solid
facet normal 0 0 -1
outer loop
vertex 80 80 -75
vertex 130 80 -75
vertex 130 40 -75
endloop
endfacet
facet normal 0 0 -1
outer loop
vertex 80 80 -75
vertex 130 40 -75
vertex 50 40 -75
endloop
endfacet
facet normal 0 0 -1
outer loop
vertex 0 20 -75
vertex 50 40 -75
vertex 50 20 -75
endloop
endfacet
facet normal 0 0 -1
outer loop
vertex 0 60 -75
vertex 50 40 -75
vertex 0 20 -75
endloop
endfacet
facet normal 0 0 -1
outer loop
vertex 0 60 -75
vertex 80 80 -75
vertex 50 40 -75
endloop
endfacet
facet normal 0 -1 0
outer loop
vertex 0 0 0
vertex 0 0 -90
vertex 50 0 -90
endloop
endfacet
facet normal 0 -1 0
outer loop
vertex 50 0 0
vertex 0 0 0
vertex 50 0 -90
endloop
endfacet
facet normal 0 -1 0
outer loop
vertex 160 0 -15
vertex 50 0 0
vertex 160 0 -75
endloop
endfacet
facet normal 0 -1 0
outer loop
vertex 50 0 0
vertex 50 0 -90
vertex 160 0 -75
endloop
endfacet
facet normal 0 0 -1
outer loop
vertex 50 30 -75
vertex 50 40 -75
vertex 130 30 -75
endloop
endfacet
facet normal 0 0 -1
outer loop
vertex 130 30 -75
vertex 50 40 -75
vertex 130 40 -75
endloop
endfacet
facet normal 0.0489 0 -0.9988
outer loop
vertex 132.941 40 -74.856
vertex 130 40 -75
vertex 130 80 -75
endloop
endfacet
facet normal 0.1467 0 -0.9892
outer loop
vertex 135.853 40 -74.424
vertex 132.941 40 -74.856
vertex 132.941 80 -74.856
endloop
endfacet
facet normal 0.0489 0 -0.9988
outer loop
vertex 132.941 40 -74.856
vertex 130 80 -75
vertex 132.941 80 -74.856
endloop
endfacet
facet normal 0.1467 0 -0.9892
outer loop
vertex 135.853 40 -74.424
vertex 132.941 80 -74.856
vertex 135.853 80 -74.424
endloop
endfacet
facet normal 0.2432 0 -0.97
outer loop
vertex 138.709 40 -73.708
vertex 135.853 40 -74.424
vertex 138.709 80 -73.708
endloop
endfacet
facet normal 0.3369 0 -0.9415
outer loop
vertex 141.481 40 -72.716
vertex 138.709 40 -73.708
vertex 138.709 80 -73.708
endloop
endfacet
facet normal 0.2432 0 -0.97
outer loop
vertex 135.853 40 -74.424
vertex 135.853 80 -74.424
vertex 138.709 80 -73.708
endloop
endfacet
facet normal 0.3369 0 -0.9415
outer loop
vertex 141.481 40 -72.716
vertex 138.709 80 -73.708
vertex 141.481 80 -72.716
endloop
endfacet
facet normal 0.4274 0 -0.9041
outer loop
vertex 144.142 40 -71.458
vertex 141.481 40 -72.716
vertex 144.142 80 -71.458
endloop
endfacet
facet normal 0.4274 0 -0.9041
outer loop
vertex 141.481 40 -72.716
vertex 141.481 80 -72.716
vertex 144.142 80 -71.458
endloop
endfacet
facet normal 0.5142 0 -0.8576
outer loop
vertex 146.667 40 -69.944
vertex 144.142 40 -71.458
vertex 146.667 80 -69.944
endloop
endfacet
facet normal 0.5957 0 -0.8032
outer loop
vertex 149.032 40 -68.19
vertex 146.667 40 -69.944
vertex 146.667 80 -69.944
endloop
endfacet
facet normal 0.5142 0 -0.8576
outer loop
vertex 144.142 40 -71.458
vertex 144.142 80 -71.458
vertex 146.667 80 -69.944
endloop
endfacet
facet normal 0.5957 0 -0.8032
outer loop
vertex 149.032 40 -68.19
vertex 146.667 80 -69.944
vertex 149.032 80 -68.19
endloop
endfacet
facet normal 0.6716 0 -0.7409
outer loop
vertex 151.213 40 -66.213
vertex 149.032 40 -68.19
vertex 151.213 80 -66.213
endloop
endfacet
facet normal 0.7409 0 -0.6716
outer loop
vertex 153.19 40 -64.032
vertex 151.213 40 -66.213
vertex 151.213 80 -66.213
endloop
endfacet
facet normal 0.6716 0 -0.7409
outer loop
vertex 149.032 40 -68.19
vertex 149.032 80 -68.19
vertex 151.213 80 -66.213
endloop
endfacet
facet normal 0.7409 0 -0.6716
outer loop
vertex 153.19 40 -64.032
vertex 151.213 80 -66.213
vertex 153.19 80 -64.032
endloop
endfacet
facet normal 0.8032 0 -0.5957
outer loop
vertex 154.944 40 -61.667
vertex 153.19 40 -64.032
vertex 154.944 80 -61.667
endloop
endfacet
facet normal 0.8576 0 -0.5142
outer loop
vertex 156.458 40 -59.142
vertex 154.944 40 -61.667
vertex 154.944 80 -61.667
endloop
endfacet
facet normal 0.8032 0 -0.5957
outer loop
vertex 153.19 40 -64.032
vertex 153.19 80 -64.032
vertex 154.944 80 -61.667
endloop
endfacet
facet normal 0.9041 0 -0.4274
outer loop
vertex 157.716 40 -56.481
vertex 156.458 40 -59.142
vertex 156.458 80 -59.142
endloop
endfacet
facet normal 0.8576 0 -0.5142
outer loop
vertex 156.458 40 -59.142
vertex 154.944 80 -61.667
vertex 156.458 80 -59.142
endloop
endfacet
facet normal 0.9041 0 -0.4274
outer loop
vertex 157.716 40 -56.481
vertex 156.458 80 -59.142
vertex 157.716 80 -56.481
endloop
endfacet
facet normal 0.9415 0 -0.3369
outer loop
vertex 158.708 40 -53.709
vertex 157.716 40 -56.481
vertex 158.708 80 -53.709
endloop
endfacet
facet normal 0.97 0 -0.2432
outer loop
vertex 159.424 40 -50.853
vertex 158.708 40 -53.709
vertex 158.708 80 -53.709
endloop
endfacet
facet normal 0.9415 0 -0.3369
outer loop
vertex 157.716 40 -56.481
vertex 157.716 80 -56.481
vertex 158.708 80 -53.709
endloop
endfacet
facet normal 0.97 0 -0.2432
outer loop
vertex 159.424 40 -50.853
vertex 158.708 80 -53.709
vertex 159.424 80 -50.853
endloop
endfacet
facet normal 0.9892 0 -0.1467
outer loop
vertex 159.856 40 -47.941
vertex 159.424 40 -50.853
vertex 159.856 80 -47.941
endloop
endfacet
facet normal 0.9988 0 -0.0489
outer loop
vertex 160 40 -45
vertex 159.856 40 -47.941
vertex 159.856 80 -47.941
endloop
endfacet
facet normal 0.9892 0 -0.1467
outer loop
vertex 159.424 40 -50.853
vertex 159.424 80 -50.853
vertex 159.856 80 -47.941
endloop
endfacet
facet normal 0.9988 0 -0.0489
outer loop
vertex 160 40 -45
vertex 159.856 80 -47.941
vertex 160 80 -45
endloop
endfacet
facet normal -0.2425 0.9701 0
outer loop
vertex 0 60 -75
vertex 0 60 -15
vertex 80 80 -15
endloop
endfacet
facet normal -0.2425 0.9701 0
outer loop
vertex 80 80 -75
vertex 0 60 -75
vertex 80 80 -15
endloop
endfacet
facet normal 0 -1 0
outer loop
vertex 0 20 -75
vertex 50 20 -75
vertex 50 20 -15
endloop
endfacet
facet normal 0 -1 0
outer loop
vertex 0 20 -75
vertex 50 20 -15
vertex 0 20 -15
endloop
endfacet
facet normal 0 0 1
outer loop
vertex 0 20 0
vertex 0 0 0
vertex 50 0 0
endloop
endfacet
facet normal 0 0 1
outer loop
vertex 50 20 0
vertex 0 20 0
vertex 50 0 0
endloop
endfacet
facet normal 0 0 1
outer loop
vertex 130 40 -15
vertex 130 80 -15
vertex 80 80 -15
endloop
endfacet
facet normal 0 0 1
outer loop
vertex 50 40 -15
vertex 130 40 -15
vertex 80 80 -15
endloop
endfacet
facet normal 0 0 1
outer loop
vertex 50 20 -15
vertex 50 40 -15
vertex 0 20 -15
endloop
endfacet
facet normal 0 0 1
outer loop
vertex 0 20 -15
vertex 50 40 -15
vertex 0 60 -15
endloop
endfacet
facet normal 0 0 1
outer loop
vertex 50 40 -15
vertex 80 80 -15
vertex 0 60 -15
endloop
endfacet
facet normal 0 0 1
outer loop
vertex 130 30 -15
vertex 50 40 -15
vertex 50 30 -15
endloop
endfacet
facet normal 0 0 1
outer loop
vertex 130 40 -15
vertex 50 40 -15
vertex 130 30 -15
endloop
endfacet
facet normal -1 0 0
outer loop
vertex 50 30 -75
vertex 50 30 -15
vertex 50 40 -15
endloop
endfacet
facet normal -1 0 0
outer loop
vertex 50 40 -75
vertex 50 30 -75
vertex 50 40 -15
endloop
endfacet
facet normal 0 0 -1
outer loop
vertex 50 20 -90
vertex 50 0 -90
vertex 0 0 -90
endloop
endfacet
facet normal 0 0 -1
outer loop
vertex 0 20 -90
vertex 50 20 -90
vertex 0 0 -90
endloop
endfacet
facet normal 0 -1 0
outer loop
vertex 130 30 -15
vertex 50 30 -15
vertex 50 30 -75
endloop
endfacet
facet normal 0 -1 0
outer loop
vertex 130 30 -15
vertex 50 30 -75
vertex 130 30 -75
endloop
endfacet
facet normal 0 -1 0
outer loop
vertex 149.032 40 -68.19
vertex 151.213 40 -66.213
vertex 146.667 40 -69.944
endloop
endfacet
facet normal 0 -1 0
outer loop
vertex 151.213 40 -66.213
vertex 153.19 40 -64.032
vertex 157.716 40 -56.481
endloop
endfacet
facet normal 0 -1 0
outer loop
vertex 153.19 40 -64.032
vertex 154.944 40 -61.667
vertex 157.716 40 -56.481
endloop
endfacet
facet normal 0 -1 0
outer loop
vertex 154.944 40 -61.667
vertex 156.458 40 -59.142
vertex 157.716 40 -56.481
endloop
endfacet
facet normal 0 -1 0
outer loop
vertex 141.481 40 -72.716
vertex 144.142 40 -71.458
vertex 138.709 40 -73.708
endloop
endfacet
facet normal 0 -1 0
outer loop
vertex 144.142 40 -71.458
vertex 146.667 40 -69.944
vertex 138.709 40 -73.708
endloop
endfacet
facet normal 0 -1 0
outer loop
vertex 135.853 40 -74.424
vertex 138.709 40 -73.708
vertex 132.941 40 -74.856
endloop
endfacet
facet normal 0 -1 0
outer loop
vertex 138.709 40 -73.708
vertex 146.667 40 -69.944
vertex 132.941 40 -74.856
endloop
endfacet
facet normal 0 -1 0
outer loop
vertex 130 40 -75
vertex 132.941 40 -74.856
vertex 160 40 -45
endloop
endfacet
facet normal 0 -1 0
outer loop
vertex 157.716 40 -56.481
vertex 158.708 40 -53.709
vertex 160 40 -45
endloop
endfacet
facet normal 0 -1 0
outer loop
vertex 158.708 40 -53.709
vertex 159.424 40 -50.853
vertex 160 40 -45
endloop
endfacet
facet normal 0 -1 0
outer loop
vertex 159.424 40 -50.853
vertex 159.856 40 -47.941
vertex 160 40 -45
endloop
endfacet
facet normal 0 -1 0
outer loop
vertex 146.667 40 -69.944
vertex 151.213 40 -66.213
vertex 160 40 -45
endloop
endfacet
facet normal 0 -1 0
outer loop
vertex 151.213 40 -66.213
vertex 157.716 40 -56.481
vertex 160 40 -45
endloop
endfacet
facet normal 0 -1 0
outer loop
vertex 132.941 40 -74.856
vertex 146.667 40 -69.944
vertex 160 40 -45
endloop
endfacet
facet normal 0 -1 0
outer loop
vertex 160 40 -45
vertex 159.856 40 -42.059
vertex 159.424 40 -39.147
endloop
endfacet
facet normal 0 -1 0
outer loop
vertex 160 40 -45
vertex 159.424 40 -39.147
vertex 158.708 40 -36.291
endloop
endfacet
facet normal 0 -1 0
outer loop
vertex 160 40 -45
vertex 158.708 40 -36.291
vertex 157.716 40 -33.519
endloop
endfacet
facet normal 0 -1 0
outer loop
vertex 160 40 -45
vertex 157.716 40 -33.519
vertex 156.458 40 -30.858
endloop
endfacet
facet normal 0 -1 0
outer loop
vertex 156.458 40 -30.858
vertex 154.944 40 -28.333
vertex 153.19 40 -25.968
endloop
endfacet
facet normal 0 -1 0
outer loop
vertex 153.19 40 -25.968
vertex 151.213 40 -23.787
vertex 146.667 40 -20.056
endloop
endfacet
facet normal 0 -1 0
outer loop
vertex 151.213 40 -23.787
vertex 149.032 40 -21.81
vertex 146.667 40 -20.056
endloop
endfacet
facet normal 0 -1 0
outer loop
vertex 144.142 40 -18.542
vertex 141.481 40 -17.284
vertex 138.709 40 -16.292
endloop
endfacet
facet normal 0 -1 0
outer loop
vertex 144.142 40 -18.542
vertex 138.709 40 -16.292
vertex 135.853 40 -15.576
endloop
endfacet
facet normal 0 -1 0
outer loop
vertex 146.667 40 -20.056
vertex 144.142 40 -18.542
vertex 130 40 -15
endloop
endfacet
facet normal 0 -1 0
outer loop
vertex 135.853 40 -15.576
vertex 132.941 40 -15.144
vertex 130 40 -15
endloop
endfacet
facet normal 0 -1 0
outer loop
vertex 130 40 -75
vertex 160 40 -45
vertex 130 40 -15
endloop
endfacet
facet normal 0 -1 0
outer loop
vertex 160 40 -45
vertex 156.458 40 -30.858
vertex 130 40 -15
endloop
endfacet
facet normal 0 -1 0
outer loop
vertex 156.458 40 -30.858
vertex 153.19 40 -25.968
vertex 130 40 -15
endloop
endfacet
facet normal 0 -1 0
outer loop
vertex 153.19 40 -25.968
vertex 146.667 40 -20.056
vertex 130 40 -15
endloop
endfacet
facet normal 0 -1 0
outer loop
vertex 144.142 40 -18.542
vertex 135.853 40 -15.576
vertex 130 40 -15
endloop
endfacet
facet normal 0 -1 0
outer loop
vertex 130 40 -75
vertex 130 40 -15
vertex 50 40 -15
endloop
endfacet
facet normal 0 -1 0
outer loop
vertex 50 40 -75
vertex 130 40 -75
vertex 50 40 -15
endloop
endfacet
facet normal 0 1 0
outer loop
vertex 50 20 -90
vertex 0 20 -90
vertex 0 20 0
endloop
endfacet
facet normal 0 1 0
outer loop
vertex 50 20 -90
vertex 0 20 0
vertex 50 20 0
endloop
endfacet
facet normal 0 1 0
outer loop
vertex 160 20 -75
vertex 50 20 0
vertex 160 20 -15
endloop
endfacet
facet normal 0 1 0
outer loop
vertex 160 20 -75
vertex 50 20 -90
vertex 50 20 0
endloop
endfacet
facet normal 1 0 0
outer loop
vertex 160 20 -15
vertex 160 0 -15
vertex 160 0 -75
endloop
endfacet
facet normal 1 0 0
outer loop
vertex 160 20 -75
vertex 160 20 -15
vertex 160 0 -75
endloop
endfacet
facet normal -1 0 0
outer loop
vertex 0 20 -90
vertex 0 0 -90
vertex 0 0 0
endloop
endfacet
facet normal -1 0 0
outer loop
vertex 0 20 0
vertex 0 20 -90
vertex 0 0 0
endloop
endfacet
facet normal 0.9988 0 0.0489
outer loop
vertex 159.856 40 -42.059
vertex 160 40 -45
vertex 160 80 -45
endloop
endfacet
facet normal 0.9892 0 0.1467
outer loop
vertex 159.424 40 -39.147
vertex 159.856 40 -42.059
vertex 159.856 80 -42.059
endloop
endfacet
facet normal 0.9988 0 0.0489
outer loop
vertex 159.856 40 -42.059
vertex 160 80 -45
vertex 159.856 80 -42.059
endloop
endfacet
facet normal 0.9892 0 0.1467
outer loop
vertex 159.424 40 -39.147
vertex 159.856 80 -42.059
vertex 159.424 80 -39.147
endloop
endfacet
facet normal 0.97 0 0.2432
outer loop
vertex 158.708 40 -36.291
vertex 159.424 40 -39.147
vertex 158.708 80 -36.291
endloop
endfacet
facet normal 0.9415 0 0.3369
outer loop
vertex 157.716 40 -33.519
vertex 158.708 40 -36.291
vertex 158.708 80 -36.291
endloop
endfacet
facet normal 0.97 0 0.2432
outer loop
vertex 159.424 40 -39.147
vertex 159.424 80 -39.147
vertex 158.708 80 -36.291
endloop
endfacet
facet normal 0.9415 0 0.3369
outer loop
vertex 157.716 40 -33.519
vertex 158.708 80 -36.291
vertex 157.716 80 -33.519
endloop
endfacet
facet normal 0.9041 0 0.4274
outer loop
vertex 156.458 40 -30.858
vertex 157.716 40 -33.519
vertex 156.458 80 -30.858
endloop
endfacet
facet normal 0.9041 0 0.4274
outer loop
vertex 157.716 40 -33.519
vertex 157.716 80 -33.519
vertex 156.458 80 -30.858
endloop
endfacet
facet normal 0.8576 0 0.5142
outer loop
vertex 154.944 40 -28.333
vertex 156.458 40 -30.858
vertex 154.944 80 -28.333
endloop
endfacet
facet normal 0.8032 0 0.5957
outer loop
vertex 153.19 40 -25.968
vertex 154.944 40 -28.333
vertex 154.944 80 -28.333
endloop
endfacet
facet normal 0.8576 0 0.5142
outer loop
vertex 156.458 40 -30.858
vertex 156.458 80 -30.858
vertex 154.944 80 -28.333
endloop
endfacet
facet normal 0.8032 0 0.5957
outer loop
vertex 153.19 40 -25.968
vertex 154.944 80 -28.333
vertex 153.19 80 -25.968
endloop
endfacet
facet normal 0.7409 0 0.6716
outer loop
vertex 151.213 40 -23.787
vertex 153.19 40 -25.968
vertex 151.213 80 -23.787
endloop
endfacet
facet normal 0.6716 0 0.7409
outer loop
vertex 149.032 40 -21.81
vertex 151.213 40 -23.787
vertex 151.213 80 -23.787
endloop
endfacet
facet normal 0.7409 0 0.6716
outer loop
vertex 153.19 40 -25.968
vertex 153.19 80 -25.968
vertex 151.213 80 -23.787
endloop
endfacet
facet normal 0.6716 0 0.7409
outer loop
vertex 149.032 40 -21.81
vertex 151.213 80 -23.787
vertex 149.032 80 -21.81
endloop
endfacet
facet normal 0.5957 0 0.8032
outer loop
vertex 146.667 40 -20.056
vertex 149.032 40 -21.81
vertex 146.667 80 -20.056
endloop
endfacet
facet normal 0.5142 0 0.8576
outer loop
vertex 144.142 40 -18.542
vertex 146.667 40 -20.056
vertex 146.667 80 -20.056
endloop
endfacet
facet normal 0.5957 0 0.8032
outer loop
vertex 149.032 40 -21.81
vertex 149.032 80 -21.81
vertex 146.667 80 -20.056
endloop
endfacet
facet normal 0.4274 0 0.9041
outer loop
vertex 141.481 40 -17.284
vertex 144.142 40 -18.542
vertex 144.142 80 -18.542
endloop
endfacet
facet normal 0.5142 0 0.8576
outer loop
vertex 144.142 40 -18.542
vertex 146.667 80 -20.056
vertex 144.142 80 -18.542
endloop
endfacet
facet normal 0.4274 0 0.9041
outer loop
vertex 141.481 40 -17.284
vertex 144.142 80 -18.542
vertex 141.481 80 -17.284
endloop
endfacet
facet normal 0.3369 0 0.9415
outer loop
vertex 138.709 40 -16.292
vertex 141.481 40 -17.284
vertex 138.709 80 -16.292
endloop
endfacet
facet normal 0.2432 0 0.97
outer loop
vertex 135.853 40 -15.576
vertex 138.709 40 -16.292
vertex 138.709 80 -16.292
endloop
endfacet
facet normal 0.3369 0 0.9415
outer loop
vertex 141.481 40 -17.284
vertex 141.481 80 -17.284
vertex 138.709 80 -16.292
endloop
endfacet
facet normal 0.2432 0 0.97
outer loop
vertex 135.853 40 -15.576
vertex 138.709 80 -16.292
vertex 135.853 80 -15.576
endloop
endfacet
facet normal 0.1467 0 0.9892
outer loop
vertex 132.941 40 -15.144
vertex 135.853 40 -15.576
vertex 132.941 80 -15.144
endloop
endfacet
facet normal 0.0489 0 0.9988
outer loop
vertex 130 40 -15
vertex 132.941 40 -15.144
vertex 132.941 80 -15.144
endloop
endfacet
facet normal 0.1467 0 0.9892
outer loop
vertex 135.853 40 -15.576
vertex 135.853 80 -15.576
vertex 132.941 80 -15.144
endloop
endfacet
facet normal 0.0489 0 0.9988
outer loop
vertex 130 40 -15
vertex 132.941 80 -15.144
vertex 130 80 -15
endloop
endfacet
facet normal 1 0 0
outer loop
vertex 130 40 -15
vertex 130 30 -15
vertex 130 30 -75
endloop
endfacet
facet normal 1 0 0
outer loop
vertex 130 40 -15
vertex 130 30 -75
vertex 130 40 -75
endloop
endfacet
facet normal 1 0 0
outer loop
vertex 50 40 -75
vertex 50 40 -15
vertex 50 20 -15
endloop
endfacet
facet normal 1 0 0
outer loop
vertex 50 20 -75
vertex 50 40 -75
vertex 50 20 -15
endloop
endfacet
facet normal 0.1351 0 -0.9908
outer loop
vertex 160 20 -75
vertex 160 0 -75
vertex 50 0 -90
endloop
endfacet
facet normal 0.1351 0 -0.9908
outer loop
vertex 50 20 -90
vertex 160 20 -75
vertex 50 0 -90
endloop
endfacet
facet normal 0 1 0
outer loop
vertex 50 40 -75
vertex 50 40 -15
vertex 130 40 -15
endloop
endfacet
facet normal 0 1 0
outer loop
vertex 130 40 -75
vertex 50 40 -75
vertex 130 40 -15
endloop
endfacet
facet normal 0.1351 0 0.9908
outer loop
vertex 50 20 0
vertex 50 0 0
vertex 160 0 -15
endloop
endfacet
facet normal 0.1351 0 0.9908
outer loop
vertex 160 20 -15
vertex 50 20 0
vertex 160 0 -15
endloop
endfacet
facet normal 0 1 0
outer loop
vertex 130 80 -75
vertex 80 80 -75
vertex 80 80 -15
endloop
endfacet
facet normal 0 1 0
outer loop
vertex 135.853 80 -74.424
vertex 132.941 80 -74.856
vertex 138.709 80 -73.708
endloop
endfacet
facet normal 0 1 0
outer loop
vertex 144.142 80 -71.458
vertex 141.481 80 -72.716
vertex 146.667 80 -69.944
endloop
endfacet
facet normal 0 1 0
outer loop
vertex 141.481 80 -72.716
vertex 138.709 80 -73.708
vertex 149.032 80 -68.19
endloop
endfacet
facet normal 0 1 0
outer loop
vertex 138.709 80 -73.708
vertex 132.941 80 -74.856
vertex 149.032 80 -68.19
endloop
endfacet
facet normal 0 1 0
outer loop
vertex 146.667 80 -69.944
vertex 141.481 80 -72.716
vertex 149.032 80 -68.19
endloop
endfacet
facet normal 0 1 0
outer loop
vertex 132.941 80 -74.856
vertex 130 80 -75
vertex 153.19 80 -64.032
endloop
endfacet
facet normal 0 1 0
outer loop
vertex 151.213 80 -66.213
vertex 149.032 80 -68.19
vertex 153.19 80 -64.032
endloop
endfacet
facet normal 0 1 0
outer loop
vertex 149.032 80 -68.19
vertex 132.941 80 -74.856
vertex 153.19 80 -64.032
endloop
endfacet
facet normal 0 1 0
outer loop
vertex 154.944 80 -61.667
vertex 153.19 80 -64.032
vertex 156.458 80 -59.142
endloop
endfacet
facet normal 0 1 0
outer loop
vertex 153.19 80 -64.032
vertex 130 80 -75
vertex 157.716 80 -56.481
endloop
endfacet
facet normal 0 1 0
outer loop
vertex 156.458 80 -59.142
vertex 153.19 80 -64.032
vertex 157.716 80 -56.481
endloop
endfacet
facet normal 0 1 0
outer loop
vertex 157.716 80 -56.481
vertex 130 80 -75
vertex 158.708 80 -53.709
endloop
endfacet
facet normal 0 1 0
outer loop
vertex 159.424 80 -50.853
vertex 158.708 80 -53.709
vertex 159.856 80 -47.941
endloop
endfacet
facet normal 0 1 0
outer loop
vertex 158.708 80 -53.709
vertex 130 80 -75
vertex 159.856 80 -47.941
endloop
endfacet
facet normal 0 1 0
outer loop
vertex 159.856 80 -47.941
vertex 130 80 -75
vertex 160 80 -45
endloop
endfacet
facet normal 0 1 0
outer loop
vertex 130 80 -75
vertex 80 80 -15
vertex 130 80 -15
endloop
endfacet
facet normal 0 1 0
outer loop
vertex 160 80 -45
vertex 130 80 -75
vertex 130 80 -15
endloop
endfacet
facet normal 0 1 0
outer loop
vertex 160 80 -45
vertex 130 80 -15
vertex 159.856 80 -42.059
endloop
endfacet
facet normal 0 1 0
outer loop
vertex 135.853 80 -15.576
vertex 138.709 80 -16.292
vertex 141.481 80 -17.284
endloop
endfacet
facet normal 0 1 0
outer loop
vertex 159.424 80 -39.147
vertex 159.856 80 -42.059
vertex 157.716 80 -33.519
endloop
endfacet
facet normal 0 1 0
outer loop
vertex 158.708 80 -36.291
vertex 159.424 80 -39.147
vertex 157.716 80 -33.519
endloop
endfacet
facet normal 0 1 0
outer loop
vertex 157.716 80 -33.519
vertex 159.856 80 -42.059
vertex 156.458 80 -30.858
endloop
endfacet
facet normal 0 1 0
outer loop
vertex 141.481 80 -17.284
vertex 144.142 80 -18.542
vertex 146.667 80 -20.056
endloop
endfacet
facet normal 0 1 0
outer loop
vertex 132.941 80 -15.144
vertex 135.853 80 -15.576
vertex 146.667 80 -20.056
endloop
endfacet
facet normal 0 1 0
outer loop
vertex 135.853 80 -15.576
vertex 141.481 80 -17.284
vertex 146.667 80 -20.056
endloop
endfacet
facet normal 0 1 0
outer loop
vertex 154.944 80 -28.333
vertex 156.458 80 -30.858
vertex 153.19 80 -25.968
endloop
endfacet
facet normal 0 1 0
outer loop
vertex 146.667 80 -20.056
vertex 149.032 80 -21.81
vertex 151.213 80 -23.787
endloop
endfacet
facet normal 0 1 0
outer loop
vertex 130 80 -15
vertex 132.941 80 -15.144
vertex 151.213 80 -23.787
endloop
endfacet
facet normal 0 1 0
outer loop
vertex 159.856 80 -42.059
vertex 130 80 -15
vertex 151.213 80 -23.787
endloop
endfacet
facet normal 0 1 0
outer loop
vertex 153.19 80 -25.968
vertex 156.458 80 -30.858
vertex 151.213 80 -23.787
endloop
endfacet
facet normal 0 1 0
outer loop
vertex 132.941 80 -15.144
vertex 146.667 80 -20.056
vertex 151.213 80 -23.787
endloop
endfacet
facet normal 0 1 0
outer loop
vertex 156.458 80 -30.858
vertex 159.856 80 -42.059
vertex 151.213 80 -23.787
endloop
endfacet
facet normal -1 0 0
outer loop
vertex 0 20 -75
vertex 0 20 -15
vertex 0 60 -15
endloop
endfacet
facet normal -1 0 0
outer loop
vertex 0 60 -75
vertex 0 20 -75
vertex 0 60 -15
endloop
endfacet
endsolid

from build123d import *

# Parameters (mm, degrees)
EXTRUDE1_DEPTH = 20
EXTRUDE2_DEPTH = 60
EXTRUDE8_DEPTH = 40
SKETCH4_W      = 80
SKETCH4_H      = 10
EXTRUDE9_DEPTH = 60


with BuildPart() as part:
    # Sketch1 → Extrude1 (new body)
    with BuildSketch(Plane(origin=(0, 0, 0), x_dir=(1, 0, 0), z_dir=(0, 1, 0))):
        Polygon((50, 0), (160, 15), (160, 75), (50, 90), (0, 90), (0, 0), align=None)
    extrude(amount=EXTRUDE1_DEPTH)


with BuildPart() as body_2:
    # Sketch2 → Extrude2 (new body)
    with BuildSketch(Plane.XY.offset(-15)):
        Polygon((0, 20), (0, 60), (80, 80), (160, 80), (160, 40), (50, 40), (50, 20), align=None)
    extrude(amount=-EXTRUDE2_DEPTH)

    # Sketch3 → Extrude8 (cut)
    with BuildSketch(Plane(origin=(0, 80, 0), x_dir=(1, 0, 0), z_dir=(0, 1, 0))):
        with BuildLine():
            Line((160, 15), (160, 45))
            ThreePointArc((160, 45), (151.213203436, 23.786796564), (130, 15))
            Line((130, 15), (160, 15))
        make_face()
        with BuildLine():
            Line((160, 75), (130, 75))
            ThreePointArc((130, 75), (151.213203436, 66.213203436), (160, 45))
            Line((160, 45), (160, 75))
        make_face()
    extrude(amount=-EXTRUDE8_DEPTH, mode=Mode.SUBTRACT)


with BuildPart() as body_3:
    # Sketch4 → Extrude9 (new body)
    with BuildSketch(Plane.XY.offset(-15)):
        with Locations((90, 35)):
            Rectangle(SKETCH4_W, SKETCH4_H)
    extrude(amount=-EXTRUDE9_DEPTH)


solid = Compound([part.part, body_2.part, body_3.part])
